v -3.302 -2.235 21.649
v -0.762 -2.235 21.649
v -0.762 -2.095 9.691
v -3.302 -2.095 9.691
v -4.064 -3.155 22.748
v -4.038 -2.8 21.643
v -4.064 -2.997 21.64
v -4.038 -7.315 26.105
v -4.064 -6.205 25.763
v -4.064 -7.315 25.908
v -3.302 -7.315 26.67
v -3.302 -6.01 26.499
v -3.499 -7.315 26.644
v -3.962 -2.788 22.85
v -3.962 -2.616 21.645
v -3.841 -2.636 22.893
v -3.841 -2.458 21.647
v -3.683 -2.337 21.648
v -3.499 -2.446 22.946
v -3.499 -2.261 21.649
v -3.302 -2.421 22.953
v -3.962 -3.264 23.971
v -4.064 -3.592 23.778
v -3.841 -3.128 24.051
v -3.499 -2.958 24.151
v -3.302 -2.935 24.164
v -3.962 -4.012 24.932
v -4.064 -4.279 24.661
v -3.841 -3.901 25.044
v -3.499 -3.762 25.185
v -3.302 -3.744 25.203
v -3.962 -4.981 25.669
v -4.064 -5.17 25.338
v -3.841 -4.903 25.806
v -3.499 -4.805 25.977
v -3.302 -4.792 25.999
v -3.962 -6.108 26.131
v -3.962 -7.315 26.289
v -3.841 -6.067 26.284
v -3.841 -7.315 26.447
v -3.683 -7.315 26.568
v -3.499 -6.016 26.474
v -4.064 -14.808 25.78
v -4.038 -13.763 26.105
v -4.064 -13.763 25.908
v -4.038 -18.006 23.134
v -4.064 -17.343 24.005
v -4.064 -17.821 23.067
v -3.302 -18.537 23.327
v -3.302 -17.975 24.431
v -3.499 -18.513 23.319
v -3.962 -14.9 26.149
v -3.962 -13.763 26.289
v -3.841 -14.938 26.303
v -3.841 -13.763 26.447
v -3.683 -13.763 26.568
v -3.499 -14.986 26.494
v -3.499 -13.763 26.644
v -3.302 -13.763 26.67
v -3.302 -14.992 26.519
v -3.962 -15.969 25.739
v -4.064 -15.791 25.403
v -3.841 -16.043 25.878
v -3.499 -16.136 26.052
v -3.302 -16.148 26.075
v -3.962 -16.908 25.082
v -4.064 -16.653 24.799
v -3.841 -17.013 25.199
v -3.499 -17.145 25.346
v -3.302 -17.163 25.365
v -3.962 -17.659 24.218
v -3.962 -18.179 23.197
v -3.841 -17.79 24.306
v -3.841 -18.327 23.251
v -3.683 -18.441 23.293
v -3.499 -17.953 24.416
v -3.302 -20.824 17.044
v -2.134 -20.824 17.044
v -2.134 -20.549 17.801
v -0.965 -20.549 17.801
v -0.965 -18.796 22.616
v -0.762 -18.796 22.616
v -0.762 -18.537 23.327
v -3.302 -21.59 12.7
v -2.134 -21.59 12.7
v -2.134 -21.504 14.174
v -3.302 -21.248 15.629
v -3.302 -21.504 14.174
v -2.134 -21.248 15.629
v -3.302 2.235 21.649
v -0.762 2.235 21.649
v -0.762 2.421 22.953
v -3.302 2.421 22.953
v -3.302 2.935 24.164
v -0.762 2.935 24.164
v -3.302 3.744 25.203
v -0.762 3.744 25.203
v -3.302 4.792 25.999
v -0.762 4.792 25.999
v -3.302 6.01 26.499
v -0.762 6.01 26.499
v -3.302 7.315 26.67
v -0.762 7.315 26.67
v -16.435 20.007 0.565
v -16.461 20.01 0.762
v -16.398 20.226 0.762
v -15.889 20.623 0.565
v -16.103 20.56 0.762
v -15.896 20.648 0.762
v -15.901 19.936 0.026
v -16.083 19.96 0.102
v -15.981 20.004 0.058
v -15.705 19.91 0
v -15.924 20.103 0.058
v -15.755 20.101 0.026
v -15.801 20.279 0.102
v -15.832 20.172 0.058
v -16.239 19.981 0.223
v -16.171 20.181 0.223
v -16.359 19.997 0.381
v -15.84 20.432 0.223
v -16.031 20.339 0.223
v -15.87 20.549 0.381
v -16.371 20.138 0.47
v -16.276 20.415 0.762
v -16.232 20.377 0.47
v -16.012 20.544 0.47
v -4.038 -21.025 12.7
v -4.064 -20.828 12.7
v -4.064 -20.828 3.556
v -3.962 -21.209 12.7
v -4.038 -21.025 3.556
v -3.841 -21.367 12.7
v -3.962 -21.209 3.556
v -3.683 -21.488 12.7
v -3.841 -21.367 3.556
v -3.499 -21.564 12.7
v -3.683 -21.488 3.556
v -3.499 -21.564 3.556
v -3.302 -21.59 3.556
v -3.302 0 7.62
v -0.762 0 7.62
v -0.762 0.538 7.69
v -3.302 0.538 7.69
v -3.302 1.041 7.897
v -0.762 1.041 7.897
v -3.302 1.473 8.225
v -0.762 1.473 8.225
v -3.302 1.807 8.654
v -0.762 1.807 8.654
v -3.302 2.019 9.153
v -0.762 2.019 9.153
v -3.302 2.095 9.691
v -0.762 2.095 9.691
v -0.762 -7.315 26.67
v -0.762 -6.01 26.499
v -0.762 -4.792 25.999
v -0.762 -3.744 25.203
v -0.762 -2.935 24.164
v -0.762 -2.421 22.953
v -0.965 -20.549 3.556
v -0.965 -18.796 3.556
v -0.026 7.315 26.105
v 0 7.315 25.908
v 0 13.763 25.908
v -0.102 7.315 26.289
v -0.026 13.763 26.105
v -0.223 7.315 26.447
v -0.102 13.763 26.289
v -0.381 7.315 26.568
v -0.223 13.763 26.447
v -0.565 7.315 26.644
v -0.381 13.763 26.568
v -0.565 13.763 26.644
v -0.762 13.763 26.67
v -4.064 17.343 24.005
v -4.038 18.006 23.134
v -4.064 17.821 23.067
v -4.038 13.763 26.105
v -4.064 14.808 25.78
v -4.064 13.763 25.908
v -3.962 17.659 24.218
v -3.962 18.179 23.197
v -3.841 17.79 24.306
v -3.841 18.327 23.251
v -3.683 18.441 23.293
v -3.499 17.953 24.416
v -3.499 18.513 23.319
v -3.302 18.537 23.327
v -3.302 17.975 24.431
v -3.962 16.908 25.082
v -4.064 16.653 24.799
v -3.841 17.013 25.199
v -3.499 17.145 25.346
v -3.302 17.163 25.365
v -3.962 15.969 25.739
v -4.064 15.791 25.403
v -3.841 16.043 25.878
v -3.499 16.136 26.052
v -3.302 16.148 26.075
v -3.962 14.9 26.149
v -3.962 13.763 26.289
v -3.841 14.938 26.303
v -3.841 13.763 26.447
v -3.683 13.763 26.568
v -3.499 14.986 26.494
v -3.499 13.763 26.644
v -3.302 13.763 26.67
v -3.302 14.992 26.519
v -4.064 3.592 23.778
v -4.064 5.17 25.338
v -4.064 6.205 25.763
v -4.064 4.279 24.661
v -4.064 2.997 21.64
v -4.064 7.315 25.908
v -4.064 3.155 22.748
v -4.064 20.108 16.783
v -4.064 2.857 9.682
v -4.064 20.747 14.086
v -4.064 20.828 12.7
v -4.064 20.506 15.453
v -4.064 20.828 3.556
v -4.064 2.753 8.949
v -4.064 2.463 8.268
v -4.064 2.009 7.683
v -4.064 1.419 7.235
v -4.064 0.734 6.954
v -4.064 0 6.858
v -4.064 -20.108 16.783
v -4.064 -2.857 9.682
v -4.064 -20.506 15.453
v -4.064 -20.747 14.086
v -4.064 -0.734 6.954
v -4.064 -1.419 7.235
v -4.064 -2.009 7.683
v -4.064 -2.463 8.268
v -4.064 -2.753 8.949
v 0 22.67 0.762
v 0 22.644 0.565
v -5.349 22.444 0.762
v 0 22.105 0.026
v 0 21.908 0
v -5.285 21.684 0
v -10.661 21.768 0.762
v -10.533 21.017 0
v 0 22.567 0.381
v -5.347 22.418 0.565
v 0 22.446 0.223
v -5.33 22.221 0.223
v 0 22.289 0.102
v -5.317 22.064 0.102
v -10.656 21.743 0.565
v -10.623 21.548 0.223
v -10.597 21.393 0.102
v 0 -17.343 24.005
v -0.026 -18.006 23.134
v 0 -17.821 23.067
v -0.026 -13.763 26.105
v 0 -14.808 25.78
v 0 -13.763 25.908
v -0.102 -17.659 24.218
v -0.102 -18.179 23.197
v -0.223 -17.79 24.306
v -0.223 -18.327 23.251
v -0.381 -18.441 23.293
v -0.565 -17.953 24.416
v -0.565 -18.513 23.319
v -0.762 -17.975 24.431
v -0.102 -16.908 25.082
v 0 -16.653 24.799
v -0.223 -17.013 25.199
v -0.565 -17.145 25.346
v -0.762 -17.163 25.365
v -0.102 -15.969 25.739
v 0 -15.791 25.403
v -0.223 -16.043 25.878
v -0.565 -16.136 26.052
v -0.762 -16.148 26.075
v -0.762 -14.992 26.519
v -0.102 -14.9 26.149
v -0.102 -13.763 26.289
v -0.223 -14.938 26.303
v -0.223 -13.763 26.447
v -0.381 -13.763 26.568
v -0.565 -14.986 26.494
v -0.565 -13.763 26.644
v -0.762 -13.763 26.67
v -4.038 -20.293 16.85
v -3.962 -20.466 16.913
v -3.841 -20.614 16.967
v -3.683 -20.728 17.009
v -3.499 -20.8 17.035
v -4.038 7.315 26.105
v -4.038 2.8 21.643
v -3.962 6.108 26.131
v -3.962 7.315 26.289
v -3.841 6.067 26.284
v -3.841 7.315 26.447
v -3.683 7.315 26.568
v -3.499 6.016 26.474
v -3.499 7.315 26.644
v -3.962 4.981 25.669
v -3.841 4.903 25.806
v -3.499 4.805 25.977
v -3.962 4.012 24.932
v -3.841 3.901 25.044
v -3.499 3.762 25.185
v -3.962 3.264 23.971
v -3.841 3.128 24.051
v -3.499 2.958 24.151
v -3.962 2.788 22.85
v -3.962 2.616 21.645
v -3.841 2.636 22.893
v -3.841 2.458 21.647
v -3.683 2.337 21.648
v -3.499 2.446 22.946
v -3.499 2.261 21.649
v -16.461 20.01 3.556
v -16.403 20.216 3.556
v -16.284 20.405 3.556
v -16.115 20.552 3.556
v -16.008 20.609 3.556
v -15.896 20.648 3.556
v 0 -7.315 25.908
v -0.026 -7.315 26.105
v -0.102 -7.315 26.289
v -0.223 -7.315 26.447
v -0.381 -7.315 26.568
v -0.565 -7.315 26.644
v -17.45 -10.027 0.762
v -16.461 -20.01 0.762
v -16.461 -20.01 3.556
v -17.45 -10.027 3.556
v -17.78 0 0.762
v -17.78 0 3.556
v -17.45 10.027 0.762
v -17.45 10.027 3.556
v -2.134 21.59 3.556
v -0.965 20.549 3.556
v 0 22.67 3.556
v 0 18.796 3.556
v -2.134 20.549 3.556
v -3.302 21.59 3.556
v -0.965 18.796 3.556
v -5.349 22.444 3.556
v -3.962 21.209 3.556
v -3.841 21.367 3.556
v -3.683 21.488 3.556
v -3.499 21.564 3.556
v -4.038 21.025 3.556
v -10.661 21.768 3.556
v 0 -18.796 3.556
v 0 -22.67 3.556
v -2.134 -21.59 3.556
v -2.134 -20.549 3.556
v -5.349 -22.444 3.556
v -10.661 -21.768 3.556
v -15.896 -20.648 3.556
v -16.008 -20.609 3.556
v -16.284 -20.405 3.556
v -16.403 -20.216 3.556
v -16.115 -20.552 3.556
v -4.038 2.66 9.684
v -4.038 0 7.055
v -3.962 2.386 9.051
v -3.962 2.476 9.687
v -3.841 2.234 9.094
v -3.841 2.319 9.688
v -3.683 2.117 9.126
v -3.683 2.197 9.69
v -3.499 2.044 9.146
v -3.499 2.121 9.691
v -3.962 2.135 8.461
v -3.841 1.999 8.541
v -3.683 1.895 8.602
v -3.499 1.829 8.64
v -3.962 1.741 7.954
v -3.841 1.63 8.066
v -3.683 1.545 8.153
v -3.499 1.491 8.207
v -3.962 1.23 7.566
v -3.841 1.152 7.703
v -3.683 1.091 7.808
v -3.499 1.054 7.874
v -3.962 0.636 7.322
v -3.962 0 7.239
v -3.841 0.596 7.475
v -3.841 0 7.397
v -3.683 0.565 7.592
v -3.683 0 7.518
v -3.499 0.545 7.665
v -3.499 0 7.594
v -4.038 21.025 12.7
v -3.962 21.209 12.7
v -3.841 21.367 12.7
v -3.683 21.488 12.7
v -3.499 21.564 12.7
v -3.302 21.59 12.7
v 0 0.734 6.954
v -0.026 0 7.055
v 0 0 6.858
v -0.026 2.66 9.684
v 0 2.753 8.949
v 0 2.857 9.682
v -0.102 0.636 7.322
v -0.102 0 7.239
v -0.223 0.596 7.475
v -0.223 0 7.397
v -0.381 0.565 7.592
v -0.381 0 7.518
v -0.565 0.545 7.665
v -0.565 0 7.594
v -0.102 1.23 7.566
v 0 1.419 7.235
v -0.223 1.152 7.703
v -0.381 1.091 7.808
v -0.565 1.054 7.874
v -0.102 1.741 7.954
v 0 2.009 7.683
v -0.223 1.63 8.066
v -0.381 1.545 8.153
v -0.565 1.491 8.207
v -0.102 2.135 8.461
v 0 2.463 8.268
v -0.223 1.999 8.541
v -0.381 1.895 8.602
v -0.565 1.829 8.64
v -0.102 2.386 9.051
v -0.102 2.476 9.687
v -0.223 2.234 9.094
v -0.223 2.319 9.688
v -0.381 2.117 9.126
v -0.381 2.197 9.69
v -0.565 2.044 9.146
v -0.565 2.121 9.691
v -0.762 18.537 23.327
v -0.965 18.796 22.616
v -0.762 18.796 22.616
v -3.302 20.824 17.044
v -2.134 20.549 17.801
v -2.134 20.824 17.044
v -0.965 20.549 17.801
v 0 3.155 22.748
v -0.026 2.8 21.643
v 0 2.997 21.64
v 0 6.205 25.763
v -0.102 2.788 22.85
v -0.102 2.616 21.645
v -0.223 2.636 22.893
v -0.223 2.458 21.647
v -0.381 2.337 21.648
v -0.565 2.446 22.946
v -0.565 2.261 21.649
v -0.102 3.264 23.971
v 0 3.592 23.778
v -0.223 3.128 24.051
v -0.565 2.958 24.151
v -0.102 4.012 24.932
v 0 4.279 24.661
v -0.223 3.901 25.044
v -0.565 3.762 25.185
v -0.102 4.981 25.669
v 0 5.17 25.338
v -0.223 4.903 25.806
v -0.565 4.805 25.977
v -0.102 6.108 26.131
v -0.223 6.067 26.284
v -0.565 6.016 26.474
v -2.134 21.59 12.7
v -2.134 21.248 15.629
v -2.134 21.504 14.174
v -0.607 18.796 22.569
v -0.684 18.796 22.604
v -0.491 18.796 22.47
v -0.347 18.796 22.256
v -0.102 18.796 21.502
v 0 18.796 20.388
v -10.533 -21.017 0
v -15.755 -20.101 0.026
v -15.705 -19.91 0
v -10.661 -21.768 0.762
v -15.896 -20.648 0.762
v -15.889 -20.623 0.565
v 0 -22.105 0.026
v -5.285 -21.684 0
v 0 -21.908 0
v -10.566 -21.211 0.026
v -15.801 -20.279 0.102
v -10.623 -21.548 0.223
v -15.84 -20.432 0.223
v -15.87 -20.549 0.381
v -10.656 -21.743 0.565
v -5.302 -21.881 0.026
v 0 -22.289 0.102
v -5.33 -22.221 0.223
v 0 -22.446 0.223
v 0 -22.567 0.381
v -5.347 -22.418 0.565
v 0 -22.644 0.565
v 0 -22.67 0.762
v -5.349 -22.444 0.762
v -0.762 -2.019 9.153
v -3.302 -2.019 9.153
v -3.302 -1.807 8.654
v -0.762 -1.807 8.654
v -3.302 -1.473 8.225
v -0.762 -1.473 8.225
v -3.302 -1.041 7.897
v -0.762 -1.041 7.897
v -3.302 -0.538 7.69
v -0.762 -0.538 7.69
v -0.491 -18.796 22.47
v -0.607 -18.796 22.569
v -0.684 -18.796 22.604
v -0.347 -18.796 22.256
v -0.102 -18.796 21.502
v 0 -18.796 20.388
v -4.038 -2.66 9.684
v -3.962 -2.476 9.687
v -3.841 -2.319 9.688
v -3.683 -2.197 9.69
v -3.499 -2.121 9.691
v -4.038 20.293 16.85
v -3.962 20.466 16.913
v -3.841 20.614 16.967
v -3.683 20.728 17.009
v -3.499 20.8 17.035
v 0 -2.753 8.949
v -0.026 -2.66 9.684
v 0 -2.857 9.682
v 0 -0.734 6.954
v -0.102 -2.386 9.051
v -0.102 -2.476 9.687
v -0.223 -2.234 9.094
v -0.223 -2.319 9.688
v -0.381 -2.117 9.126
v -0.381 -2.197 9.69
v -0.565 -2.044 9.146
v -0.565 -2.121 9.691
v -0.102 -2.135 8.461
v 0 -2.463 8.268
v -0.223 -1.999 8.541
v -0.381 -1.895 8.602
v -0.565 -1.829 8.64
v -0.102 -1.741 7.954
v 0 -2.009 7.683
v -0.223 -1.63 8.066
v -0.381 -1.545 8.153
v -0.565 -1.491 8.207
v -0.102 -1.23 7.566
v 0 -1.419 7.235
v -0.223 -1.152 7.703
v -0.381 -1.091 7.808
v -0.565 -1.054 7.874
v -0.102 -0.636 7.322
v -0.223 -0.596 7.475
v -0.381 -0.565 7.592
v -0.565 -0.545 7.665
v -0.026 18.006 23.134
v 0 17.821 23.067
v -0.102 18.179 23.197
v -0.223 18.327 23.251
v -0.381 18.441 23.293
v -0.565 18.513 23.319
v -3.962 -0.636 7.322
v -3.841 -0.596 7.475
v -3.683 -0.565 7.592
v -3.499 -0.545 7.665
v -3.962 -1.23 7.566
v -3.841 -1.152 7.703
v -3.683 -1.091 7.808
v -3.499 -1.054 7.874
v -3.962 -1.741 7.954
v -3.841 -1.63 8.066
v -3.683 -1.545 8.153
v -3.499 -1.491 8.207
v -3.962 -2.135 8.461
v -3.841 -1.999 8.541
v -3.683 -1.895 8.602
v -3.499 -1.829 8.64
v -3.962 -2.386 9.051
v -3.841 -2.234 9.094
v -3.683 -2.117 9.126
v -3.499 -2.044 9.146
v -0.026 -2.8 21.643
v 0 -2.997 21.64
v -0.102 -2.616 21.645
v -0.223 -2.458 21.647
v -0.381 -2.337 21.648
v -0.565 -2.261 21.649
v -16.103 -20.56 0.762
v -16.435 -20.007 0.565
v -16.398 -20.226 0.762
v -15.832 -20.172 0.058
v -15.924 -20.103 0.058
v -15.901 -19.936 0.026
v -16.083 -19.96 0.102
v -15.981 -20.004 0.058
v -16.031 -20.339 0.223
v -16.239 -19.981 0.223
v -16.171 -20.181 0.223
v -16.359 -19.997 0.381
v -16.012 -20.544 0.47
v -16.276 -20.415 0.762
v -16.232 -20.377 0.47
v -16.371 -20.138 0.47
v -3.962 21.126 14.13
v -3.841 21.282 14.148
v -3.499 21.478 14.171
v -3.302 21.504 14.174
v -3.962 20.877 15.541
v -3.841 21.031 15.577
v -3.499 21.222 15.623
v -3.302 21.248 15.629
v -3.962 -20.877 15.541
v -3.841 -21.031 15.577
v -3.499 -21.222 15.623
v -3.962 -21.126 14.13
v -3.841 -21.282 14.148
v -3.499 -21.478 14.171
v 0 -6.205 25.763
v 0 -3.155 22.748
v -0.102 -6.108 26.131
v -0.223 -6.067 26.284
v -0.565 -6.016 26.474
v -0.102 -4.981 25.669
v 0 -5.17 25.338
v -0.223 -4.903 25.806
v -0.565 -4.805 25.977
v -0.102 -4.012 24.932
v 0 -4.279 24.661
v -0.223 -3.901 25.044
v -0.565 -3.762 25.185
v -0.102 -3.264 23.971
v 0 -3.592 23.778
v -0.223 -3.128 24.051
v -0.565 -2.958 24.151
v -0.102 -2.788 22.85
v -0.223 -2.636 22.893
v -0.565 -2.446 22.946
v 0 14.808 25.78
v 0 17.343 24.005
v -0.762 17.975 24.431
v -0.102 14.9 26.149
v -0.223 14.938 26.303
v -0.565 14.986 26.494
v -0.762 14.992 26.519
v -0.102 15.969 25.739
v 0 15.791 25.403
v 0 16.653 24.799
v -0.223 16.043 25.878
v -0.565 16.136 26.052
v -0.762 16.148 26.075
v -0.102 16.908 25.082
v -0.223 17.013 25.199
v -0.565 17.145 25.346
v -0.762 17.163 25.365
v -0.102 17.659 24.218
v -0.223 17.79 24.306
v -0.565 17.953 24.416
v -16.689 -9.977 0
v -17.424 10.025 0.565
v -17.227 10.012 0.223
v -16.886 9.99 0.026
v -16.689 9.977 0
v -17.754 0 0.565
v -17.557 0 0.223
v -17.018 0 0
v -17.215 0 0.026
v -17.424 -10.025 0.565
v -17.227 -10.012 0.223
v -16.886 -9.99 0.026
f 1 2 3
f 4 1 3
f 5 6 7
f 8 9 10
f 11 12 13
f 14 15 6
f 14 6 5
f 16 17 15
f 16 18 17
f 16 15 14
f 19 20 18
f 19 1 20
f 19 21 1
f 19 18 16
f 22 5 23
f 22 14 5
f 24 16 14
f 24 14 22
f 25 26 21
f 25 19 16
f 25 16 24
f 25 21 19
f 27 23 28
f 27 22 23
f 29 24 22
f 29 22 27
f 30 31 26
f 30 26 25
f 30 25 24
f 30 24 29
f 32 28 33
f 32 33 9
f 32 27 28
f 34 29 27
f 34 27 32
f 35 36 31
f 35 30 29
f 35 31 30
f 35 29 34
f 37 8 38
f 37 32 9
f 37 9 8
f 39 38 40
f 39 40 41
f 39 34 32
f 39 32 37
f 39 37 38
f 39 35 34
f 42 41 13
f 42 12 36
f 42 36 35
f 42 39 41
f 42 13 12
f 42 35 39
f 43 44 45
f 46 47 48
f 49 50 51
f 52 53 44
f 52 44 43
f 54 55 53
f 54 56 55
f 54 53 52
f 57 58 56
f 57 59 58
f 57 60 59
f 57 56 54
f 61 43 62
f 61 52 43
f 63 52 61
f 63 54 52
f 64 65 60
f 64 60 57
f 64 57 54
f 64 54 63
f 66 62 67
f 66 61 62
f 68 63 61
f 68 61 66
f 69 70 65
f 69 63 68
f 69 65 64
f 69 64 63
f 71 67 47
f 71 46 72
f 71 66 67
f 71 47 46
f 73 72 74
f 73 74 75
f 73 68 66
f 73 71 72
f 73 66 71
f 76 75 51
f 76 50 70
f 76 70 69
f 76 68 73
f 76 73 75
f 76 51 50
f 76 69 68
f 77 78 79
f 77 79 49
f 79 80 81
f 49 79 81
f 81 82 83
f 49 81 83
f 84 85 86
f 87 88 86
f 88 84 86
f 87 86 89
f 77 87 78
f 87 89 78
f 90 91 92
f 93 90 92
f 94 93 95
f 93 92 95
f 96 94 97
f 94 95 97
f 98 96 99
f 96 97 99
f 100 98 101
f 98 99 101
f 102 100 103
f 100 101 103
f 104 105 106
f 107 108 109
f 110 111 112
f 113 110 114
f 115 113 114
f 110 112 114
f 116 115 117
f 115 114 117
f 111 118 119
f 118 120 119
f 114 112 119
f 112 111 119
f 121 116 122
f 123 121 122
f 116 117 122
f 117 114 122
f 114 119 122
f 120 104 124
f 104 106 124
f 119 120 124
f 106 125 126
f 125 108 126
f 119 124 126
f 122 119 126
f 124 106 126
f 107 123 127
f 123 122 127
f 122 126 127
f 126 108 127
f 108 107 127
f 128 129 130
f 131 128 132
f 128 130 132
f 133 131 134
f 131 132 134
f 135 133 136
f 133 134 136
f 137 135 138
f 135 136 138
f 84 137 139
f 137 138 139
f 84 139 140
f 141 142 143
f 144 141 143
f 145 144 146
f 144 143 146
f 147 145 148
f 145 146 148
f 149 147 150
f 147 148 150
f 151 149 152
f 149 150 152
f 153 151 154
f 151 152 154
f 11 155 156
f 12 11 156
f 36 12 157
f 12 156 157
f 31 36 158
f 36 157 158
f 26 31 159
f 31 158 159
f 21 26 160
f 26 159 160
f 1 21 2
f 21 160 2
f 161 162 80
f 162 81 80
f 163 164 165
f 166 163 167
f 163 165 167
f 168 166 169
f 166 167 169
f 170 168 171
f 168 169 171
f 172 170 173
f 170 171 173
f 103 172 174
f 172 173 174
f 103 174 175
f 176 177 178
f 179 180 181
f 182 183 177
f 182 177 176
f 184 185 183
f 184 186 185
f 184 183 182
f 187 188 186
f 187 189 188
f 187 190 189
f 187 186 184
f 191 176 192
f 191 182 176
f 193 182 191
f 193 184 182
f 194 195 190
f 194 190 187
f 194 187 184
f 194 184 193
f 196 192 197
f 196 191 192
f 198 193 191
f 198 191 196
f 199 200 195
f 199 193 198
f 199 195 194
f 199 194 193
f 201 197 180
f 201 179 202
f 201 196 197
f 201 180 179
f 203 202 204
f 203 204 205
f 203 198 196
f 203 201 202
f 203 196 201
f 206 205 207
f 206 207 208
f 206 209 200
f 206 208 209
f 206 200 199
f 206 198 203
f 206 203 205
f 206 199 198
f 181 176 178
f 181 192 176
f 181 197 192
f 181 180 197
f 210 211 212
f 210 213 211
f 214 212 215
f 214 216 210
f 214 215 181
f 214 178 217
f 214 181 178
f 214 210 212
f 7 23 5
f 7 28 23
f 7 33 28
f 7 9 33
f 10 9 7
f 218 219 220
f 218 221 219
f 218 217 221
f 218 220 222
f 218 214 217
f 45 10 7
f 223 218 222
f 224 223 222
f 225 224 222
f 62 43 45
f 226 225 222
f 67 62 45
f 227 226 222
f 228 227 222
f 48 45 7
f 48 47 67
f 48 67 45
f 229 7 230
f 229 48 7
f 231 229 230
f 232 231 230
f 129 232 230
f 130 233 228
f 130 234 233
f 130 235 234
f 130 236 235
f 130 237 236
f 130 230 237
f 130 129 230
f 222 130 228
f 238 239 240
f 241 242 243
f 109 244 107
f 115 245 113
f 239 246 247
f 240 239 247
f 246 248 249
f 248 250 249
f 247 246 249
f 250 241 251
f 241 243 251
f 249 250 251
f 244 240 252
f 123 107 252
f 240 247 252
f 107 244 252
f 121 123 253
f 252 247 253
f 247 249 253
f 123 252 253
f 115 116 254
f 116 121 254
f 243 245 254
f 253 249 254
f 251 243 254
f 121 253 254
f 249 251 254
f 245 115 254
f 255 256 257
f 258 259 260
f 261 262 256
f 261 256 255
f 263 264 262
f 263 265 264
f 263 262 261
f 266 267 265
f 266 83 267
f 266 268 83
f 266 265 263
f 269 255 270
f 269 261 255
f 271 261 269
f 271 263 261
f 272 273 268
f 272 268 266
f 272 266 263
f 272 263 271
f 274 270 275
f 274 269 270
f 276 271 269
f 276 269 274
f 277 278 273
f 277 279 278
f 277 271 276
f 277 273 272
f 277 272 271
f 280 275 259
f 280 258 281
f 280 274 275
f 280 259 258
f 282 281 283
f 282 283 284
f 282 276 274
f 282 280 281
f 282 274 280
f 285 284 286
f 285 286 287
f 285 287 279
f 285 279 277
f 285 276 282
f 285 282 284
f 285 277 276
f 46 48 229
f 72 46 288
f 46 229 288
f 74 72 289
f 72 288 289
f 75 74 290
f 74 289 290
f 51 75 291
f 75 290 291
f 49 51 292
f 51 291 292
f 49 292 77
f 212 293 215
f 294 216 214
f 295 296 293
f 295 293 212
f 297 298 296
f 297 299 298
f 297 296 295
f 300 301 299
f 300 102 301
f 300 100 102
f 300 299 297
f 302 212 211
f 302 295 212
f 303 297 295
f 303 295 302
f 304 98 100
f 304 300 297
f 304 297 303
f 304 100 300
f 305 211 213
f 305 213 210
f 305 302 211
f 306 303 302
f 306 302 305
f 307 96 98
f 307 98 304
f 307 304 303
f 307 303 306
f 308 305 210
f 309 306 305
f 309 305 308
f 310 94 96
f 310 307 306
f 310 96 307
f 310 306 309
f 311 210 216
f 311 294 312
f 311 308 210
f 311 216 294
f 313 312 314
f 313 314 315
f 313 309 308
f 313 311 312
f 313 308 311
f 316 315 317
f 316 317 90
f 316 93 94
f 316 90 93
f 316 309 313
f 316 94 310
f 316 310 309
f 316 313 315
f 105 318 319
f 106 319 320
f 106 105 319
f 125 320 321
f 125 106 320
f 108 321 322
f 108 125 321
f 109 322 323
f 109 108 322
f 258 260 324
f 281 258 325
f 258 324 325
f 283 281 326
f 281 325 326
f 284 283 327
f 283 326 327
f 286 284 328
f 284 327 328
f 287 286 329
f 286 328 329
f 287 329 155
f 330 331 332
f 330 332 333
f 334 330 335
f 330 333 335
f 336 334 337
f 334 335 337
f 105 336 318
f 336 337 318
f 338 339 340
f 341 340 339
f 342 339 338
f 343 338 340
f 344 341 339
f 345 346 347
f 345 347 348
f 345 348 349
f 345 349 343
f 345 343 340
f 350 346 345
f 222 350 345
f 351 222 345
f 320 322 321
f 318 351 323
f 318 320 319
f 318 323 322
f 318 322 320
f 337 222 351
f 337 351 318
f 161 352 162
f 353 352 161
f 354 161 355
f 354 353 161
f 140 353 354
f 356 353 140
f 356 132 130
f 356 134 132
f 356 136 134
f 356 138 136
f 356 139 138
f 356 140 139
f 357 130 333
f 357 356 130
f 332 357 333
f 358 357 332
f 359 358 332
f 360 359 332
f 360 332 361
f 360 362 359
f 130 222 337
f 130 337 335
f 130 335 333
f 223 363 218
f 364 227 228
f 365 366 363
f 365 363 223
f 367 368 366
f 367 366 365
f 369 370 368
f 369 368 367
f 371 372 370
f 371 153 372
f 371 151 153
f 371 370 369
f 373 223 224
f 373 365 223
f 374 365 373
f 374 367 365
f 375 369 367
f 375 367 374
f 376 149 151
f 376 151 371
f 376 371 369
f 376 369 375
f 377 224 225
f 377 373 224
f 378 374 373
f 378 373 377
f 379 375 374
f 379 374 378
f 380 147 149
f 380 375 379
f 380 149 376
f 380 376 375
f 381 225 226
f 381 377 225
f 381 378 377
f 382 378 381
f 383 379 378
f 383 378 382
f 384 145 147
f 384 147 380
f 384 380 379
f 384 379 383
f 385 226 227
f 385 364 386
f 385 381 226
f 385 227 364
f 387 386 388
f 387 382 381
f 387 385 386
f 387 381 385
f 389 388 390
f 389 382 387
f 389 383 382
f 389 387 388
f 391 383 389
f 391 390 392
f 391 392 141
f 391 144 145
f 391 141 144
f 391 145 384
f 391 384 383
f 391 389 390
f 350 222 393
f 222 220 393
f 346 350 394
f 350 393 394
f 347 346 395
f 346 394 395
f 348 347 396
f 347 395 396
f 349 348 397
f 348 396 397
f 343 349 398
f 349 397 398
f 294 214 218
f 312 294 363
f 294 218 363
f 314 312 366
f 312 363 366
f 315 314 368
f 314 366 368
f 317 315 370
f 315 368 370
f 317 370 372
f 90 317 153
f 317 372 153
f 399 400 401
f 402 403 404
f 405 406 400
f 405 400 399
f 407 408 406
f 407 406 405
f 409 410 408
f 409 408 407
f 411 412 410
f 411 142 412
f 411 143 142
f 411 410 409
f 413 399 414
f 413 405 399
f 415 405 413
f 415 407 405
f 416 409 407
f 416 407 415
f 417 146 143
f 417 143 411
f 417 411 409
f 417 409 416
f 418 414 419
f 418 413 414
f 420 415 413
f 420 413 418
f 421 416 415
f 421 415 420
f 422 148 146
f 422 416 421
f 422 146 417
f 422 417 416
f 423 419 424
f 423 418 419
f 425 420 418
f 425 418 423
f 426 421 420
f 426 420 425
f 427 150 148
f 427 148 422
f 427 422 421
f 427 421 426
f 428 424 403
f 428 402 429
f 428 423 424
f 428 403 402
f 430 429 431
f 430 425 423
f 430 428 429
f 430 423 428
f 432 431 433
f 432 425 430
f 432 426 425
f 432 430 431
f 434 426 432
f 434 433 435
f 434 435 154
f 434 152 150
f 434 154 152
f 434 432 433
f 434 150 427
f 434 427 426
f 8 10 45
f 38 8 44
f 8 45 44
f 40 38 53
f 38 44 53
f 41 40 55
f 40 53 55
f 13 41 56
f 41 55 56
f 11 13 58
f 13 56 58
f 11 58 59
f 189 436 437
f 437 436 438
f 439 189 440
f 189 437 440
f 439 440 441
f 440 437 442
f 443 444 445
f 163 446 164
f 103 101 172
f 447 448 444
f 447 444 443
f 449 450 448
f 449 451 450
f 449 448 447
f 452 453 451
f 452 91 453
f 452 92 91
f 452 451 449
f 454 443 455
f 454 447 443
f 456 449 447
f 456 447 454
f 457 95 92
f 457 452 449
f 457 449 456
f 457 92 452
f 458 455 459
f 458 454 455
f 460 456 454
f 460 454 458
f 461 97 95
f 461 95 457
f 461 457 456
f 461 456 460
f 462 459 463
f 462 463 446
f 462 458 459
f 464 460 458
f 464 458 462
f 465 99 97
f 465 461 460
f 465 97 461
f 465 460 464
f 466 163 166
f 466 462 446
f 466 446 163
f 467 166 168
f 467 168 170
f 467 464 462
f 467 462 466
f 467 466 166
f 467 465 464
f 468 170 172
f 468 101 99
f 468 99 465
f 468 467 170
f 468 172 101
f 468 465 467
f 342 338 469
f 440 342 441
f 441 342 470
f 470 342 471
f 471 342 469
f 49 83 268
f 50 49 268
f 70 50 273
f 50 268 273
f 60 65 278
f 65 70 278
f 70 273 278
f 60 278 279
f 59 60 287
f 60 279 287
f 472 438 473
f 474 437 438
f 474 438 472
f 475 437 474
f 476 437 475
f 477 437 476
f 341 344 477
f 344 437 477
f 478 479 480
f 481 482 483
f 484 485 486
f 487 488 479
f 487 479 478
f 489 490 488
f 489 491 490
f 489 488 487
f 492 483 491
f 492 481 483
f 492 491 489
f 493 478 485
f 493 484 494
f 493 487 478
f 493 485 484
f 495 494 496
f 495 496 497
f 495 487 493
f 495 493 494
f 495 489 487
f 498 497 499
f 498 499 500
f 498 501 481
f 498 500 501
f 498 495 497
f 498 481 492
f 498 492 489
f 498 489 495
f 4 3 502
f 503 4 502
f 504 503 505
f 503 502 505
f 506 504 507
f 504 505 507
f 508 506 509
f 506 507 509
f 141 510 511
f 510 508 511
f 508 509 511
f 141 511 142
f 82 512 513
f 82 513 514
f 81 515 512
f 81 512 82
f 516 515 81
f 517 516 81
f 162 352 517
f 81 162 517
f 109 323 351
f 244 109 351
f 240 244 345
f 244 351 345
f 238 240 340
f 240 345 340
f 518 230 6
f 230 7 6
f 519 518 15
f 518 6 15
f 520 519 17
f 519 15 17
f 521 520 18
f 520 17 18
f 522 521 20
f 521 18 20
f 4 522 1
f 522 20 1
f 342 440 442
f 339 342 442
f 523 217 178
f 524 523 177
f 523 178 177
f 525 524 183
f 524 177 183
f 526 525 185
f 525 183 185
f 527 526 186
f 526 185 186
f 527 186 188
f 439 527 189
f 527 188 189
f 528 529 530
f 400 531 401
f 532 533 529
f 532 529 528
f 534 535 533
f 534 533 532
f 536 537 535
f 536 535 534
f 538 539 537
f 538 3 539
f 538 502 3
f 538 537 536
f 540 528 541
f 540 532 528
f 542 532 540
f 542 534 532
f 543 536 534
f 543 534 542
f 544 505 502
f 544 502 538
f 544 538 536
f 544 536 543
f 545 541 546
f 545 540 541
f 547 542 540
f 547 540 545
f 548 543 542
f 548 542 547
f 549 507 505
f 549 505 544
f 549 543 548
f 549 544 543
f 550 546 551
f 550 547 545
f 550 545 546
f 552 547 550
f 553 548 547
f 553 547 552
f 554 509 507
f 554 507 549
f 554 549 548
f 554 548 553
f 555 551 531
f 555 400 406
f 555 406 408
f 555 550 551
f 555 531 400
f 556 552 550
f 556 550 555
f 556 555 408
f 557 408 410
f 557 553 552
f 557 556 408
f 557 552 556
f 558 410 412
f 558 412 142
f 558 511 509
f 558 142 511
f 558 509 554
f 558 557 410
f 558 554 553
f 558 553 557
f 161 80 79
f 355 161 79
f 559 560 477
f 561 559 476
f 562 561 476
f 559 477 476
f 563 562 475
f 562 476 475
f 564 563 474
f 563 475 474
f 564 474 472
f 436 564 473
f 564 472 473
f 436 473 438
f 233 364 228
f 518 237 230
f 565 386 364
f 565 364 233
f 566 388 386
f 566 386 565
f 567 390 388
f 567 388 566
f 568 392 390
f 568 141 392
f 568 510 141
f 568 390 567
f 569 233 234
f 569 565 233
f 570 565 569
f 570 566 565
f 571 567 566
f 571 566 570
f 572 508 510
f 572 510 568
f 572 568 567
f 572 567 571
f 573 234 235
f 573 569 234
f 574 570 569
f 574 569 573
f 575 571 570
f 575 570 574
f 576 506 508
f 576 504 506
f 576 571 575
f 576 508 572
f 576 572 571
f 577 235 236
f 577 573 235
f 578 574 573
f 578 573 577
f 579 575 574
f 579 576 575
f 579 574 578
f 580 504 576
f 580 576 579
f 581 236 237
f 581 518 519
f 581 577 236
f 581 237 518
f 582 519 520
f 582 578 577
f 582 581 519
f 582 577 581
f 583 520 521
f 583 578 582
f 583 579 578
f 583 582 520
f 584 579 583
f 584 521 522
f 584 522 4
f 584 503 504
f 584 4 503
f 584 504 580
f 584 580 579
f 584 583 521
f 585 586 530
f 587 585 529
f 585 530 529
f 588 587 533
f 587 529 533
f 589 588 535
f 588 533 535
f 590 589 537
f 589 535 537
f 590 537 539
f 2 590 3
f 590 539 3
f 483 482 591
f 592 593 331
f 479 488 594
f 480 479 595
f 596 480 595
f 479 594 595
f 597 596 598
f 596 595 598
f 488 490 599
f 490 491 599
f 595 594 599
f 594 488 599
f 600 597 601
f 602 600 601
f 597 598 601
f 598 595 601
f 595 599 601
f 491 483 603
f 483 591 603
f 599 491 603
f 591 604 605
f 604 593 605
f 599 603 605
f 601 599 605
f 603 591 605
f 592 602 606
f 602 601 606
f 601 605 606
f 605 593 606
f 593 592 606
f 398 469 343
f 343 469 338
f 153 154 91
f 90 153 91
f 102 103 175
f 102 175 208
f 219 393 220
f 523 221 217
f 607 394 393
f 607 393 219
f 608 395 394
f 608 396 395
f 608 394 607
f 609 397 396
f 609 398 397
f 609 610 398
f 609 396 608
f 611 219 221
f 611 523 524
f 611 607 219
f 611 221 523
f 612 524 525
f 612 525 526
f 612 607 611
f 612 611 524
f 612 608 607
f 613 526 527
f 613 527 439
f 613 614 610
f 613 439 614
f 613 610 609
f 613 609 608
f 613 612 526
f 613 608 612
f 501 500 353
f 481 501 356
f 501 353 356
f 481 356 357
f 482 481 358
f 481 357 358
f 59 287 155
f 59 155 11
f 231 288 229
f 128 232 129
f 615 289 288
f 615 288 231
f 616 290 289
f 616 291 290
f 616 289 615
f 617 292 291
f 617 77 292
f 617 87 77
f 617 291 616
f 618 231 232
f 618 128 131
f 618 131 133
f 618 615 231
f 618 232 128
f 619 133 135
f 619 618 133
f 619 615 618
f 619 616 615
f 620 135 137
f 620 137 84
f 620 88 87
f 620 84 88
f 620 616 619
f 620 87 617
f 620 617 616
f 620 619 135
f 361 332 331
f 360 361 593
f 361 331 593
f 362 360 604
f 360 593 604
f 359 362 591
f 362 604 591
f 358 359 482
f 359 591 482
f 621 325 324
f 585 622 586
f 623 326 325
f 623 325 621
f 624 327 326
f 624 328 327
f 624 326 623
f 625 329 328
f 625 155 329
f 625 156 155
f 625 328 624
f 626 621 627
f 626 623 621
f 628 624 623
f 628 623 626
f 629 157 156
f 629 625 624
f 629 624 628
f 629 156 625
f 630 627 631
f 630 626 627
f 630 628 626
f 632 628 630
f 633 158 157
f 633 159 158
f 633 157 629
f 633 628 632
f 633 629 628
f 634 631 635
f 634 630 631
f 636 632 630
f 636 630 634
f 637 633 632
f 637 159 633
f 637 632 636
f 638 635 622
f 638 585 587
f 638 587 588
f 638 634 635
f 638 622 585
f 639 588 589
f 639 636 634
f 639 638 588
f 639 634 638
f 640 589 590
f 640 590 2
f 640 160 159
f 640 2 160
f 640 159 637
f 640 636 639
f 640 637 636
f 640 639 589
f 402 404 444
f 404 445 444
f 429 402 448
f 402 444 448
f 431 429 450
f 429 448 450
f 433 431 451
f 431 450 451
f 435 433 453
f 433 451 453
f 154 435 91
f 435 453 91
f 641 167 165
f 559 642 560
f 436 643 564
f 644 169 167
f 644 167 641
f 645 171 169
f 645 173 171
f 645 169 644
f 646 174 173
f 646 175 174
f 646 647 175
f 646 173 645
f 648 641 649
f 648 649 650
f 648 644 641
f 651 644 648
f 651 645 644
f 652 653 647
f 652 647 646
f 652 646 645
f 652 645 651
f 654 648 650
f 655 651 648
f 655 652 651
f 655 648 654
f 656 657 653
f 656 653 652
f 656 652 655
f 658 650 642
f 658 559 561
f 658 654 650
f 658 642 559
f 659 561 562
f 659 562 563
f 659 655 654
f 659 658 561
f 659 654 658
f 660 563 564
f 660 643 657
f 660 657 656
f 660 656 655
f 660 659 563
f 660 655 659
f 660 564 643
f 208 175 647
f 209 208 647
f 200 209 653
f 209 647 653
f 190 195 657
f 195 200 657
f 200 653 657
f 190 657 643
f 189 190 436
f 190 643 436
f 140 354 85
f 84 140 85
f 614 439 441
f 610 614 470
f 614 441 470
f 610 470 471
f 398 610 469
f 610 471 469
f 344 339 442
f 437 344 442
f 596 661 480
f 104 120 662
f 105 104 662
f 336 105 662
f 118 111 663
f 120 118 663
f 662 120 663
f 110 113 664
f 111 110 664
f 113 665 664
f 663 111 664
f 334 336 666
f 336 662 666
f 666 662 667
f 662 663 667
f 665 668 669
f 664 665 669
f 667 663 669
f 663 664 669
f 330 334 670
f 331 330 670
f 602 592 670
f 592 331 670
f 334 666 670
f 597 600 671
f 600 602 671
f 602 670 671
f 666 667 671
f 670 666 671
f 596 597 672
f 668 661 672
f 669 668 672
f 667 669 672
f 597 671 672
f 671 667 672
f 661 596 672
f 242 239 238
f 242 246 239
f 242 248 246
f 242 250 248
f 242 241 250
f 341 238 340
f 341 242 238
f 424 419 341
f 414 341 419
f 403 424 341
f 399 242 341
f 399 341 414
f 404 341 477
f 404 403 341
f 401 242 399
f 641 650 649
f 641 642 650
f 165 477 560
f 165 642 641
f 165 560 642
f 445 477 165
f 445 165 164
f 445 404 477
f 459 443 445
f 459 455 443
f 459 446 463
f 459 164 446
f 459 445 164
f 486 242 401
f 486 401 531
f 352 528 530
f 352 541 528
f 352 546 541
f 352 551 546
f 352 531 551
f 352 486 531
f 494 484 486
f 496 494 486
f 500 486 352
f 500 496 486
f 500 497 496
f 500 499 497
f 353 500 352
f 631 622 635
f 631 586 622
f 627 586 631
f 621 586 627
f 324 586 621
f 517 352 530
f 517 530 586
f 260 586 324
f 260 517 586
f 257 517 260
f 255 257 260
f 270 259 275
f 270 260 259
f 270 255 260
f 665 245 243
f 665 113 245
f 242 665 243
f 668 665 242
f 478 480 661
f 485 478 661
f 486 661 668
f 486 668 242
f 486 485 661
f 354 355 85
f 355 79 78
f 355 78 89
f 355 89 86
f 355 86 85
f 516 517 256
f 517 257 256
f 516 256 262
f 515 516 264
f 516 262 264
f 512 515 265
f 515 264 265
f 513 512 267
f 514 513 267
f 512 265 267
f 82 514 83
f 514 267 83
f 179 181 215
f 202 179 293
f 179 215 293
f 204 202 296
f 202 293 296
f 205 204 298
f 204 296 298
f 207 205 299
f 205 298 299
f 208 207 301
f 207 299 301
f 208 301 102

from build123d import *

# Parameters (mm, degrees)
F1_DEPTH      = 22.6695
F1_DEPTH_BACK = 22.6695
F3_DEPTH      = 25.4
F5_DEPTH      = 25.4
F7_DEPTH      = 25.4
F8_R          = 0.762


with BuildPart() as f1:
    # F0 (on Front) → F1 (new body, two sides)
    with BuildSketch(Plane.XZ) as f1_sk:
        Polygon((-17.78, 3.556), (-17.78, 0), (0, 0), (0, 26.67), (-4.064, 26.67), (-4.064, 3.556), align=None)
    extrude(amount=F1_DEPTH)
    extrude(f1_sk.sketch, amount=-F1_DEPTH_BACK)

    # F2 (on face) → F3 (cut)
    with BuildSketch(Plane.YZ):
        with BuildLine():
            Line((21.59, 3.556), (22.6695, 3.556))
            Line((22.6695, 3.556), (22.6695, 27.94))
            Line((22.6695, 27.94), (0, 27.94))
            Line((0, 27.94), (-22.6695, 27.94))
            Line((-22.6695, 27.94), (-22.6695, 3.556))
            Line((-22.6695, 3.556), (-21.59, 3.556))
            Line((-21.59, 3.556), (-21.59, 12.7))
            ThreePointArc((-21.59, 12.7), (-21.3970584633, 14.9053318564), (-20.824096284, 17.0436558202))
            Line((-20.824096284, 17.0436558202), (-18.5369777572, 23.3274623281))
            ThreePointArc((-18.5369777572, 23.3274623281), (-16.6771075403, 25.751292385), (-13.7633392436, 26.67))
            Line((-13.7633392436, 26.67), (-7.3148526832, 26.67))
            ThreePointArc((-7.3148526832, 26.67), (-3.7438138302, 25.2030432478), (-2.2352, 21.6494021693))
            Line((-2.2352, 21.6494021693), (-2.0953567318, 9.6909966051))
            ThreePointArc((-2.0953567318, 9.6909966051), (-1.4730535269, 8.2251196603), (0, 7.62))
            ThreePointArc((0, 7.62), (1.4730535269, 8.2251196603), (2.0953567318, 9.6909966051))
            Line((2.0953567318, 9.6909966051), (2.2352, 21.6494021693))
            ThreePointArc((2.2352, 21.6494021693), (3.7438138302, 25.2030432478), (7.3148526832, 26.67))
            Line((7.3148526832, 26.67), (13.7633392436, 26.67))
            ThreePointArc((13.7633392436, 26.67), (16.6771075403, 25.751292385), (18.5369777572, 23.3274623281))
            Line((18.5369777572, 23.3274623281), (20.824096284, 17.0436558202))
            ThreePointArc((20.824096284, 17.0436558202), (21.3970584633, 14.9053318564), (21.59, 12.7))
            Line((21.59, 12.7), (21.59, 3.556))
        make_face()
    extrude(amount=-F3_DEPTH, mode=Mode.SUBTRACT)

    # F4 (on face) → F5 (cut)
    with BuildSketch(Plane.XY.offset(3.556)):
        Polygon((0, 22.6695), (-2.1336, 22.6695), (-2.1336, 20.5486), (-0.9652, 20.5486), (-0.9652, 18.796), (0, 18.796), align=None)
        Polygon((-2.1336, -20.5486), (-2.1336, -22.6695), (0, -22.6695), (0, -18.796), (-0.9652, -18.796), (-0.9652, -20.5486), align=None)
    extrude(amount=F5_DEPTH, mode=Mode.SUBTRACT)

    # F6 (on face) → F7 (cut)
    with BuildSketch(Plane.XY.offset(3.556)):
        with BuildLine():
            ThreePointArc((-16.3926058311, 20.5171362549), (-8.2666528236, 22.1291096803), (0, 22.6695))
            Line((0, 22.6695), (0, 25.4))
            Line((0, 25.4), (-25.4, 25.4))
            Line((-25.4, 25.4), (-25.4, -25.4))
            Line((-25.4, -25.4), (0, -25.4))
            Line((0, -25.4), (0, -22.6695))
            ThreePointArc((0, -22.6695), (-8.2666528236, -22.1291096803), (-16.3926058311, -20.5171362549))
            ThreePointArc((-16.3926058311, -20.5171362549), (-17.78, 0), (-16.3926058311, 20.5171362549))
        make_face()
    extrude(amount=-F7_DEPTH, mode=Mode.SUBTRACT)

    # F8
    f8_edges = [f1.edges().sort_by_distance(p)[0] for p in [
        (-8.266653, -22.12911, 0),
        (-17.78, 0, 0),
        (-8.266653, 22.12911, 0),
        (-16.392606, -20.517136, 1.778),
        (-16.392606, 20.517136, 1.778),
        (-4.064, 21.59, 8.128),
        (0, 0, 7.62),
    ]]
    fillet(f8_edges, radius=F8_R)


solid = f1.part
